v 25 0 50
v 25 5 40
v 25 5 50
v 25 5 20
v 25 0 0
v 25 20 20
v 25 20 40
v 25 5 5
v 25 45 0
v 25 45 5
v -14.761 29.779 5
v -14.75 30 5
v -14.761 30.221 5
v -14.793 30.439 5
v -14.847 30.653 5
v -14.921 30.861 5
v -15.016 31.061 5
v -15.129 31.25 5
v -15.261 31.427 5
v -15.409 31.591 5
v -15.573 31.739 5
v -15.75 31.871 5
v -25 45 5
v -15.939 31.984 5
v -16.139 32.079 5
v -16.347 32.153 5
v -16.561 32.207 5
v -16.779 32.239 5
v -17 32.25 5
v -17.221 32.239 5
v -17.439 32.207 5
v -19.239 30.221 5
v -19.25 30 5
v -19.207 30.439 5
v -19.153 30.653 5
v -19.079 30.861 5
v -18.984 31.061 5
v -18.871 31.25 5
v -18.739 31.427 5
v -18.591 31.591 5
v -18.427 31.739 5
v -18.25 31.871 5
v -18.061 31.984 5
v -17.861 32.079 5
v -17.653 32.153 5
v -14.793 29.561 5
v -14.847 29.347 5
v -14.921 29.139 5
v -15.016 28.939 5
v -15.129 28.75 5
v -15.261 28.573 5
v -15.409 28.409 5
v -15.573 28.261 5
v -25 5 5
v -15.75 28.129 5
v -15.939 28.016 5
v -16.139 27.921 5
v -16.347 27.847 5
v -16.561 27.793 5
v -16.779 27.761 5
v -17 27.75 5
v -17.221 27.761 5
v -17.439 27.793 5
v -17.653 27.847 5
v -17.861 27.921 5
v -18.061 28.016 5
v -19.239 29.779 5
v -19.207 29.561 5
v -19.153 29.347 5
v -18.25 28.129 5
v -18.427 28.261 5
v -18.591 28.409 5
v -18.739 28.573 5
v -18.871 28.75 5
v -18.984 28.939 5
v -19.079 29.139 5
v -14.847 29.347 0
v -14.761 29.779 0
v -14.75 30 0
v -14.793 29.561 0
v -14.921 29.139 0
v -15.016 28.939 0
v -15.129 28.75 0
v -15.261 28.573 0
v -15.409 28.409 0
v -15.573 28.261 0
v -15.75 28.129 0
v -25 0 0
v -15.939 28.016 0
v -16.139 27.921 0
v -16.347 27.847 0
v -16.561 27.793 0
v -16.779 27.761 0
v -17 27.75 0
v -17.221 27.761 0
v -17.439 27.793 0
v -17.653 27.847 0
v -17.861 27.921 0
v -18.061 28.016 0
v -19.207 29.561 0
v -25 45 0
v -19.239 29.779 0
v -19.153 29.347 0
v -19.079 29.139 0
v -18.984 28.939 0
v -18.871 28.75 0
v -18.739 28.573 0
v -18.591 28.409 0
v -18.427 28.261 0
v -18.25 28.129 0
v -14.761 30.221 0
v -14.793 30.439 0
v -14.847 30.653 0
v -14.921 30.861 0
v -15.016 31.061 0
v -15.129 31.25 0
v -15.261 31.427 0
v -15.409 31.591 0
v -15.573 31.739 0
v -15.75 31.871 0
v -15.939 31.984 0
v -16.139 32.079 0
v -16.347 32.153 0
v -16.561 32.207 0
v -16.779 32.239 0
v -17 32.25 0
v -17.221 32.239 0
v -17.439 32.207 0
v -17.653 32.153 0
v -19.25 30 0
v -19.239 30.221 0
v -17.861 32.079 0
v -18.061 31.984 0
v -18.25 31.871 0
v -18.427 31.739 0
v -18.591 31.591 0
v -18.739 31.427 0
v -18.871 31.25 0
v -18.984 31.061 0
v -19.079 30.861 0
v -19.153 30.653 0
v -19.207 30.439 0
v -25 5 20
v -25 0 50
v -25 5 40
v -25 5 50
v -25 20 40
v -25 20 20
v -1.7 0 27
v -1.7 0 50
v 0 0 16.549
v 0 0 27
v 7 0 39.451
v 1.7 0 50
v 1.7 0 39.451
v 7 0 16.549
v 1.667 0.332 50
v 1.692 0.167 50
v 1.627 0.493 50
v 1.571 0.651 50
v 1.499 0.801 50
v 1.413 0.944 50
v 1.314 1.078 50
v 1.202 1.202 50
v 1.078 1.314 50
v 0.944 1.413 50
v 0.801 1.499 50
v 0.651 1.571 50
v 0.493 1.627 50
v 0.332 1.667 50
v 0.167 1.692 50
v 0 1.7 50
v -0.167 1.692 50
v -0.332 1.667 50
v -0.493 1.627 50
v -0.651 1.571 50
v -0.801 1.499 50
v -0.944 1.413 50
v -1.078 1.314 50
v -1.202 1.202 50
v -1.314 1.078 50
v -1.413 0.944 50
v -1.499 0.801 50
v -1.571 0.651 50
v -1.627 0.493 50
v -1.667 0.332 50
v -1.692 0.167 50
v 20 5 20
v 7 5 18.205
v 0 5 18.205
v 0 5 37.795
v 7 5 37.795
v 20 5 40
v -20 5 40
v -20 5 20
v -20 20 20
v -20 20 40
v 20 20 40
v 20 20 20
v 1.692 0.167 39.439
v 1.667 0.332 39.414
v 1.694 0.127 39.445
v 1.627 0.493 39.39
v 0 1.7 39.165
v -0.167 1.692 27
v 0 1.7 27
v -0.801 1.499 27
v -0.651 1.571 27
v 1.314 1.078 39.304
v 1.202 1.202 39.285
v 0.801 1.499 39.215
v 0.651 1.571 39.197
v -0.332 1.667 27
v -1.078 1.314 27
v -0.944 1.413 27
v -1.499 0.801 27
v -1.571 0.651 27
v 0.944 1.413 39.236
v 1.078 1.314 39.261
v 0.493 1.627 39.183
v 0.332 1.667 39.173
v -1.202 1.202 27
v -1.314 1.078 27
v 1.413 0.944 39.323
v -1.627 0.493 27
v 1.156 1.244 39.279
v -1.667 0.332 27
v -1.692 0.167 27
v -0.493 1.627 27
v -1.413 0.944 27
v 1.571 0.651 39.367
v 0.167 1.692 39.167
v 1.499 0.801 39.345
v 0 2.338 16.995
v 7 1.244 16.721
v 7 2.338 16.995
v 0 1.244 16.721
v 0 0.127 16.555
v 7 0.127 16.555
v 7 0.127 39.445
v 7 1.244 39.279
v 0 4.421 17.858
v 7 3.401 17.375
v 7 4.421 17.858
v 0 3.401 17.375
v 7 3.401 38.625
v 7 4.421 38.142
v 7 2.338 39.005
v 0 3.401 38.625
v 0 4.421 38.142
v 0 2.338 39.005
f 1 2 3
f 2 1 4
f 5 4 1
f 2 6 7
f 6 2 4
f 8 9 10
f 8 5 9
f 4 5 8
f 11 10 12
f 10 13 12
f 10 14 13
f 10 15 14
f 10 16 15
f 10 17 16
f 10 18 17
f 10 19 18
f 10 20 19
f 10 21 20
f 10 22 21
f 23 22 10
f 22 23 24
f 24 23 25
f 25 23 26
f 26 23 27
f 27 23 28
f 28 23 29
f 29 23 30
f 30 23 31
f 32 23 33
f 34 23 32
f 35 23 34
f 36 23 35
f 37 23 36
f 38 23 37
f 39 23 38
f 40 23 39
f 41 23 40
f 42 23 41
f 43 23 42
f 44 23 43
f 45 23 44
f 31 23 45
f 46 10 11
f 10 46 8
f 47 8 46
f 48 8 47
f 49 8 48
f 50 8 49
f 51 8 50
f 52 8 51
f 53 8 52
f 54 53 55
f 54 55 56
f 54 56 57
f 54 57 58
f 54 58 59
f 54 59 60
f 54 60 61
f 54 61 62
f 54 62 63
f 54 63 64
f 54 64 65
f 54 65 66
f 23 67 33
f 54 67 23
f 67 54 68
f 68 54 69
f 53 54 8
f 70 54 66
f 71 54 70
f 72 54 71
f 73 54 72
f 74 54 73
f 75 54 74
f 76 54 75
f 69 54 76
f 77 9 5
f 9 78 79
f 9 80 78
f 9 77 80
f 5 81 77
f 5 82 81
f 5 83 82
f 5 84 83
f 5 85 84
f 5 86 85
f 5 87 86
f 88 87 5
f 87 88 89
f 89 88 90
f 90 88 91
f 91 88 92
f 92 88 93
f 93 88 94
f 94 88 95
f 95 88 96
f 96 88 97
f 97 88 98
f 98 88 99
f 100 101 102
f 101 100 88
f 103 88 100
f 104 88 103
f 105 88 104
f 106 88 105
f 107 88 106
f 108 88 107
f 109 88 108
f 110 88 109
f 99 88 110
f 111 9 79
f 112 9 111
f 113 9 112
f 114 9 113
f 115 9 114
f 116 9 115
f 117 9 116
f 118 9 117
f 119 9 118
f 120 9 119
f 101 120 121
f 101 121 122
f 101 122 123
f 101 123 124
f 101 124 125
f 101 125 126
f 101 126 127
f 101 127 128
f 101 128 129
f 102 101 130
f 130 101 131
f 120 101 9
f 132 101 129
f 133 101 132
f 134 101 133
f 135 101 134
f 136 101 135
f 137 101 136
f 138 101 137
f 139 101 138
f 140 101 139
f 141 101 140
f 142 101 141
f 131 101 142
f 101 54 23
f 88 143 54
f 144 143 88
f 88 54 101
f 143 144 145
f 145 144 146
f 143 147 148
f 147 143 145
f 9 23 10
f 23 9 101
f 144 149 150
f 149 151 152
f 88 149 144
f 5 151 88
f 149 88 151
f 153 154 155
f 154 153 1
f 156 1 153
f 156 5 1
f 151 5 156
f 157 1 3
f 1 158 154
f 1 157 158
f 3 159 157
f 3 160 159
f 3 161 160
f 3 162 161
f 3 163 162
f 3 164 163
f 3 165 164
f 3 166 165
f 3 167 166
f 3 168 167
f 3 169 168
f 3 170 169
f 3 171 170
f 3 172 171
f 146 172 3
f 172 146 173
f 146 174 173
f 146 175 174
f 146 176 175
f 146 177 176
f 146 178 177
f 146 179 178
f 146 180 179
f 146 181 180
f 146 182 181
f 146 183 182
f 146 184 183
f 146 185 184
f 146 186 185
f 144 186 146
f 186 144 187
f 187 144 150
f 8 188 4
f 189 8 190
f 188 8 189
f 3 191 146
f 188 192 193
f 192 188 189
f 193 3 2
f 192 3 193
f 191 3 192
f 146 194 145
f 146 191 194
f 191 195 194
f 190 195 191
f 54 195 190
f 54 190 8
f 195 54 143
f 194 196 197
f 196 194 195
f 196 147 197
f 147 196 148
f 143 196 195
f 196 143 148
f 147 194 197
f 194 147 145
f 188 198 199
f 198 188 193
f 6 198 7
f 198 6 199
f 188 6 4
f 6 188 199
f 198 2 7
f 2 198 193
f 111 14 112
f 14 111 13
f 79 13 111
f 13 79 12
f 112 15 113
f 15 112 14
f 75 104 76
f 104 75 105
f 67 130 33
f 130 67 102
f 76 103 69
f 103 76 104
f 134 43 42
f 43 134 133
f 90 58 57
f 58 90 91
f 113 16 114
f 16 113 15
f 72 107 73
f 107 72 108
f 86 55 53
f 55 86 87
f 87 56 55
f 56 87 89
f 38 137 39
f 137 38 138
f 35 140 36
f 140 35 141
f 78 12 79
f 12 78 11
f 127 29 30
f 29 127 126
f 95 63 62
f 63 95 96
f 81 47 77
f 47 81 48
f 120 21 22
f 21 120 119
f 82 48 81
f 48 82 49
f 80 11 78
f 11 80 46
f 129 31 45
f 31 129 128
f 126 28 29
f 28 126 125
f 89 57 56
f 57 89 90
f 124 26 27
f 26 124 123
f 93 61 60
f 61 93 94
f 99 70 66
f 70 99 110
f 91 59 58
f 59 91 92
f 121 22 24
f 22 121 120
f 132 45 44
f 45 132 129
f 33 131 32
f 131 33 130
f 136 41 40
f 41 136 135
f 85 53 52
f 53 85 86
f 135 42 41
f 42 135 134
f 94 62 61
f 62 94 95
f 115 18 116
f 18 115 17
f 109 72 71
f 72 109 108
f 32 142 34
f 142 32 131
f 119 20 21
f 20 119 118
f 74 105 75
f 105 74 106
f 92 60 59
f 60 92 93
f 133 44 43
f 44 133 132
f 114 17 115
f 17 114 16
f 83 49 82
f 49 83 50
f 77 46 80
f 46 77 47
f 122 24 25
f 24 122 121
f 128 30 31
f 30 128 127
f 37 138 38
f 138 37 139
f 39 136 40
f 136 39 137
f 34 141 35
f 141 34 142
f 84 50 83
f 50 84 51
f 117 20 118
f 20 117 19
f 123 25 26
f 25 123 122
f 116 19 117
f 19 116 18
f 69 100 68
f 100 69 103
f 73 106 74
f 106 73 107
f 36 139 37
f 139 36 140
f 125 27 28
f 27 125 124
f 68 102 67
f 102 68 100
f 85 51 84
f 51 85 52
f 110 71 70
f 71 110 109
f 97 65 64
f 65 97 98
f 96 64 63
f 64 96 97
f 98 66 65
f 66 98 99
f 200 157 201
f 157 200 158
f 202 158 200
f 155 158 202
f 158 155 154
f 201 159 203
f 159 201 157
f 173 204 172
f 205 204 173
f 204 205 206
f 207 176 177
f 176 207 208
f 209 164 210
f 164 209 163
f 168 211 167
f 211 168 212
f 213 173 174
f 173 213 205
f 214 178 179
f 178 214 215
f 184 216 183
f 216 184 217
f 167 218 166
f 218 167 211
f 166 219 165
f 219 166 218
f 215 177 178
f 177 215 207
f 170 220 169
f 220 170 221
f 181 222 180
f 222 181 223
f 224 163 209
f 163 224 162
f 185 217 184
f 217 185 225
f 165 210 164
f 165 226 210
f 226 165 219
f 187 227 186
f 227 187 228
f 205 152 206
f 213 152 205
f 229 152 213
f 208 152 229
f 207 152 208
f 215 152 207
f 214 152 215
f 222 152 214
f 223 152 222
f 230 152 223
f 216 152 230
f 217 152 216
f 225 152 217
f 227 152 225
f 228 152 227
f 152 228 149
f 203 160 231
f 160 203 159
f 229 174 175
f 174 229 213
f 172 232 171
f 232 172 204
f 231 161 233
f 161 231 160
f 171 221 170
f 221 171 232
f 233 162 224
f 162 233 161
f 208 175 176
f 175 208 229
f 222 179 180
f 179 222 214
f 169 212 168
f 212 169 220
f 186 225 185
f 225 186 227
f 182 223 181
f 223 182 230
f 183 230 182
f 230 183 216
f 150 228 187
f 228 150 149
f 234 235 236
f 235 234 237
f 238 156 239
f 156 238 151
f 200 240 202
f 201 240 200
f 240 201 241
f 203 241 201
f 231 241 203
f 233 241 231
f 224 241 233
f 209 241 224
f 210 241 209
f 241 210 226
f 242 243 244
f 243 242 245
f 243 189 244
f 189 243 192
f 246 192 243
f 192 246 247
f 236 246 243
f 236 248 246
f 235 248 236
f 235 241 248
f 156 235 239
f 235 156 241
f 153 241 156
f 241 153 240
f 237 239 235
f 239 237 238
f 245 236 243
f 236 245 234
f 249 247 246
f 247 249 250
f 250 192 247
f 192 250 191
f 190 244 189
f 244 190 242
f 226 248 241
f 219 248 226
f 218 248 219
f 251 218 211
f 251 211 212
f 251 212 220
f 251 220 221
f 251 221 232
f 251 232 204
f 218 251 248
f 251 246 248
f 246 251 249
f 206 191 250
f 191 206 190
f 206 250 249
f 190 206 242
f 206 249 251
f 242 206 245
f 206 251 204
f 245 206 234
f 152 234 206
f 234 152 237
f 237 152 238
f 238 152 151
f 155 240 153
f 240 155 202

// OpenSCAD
// L-shaped mounting bracket for NEMA 17 stepper motor
// Print orientation: base plate on bed (z = 0), vertical plate builds upward (+Z)

// ---------------- Parameters ----------------
$fn = 64;

// Base plate
base_x0 = -25;      // base plate X start
base_x1 = 25;       // base plate X end
base_y0 = 0;        // base plate Y start
base_y1 = 45;       // base plate Y end
base_z0 = 0;        // base plate Z start
base_z1 = 5;        // base plate Z end
mount_hole_d = 4.5; // M4 through-hole diameter
mount_hole_x = -17; // M4 hole X position
mount_hole_y = 30;  // M4 hole Y position
mount_hole_n = 2;   // number of M4 holes

// Vertical motor plate
motor_plate_x0 = -25; // motor plate X start
motor_plate_x1 = 25;  // motor plate X end
motor_plate_y0 = 0;   // motor plate Y start
motor_plate_y1 = 5;   // motor plate Y end
motor_plate_z0 = 0;   // motor plate Z start
motor_plate_z1 = 50;  // motor plate Z end

// Boss hole (motor centring boss)
boss_d = 23;         // boss hole diameter
boss_x = 0;          // boss hole X centre
boss_z = 28;         // boss hole Z centre

// Screw holes for boss
screw_d = 3.4;       // M3 screw hole diameter
screw_pattern = 31;  // square pattern side length
screw_n = 4;         // number of screw holes

// Gussets
gusset_t = 5;        // gusset thickness (along X)
gusset_w = 20;       // gusset leg along +Y
gusset_h = 20;       // gusset leg along +Z

// ---------------- Model ----------------
difference() {
    union() {
        // Base plate
        translate([base_x0, base_y0, base_z0])
            cube([base_x1 - base_x0, base_y1 - base_y0, base_z1 - base_z0]);

        // Vertical motor plate
        translate([motor_plate_x0, motor_plate_y0, motor_plate_z0])
            cube([motor_plate_x1 - motor_plate_x0,
                  motor_plate_y1 - motor_plate_y0,
                  motor_plate_z1 - motor_plate_z0]);

        // Left gusset (x = -25 to -20)
        translate([-25, gusset_w, gusset_h])
            rotate([90, 0, 0])
                cube([gusset_t, gusset_w, gusset_h]);

        // Right gusset (x = 20 to 25)
        translate([20, gusset_w, gusset_h])
            rotate([90, 0, 0])
                cube([gusset_t, gusset_w, gusset_h]);
    }

    // Base plate through-holes (M4)
    for (i = [0 : mount_hole_n - 1]) {
        translate([mount_hole_x, mount_hole_y, -1])
            cylinder(d = mount_hole_d, h = base_z1 + 2);
    }

    // Boss hole (through motor plate along Y)
    translate([boss_x, -1, boss_z])
        rotate([0, 90, 0])
            cylinder(d = boss_d, h = motor_plate_y1 - motor_plate_y0 + 2);

    // Screw holes on square pattern centred on boss hole
    for (j = [0 : screw_n - 1]) {
        for (k = [0 : screw_n - 1]) {
            translate([(j - k) * screw_pattern / 2,
                       (j + k) * screw_pattern / 2,
                       boss_z - 1])
                cylinder(d = screw_d, h = motor_plate_z1 + 2);
        }
    }
}
